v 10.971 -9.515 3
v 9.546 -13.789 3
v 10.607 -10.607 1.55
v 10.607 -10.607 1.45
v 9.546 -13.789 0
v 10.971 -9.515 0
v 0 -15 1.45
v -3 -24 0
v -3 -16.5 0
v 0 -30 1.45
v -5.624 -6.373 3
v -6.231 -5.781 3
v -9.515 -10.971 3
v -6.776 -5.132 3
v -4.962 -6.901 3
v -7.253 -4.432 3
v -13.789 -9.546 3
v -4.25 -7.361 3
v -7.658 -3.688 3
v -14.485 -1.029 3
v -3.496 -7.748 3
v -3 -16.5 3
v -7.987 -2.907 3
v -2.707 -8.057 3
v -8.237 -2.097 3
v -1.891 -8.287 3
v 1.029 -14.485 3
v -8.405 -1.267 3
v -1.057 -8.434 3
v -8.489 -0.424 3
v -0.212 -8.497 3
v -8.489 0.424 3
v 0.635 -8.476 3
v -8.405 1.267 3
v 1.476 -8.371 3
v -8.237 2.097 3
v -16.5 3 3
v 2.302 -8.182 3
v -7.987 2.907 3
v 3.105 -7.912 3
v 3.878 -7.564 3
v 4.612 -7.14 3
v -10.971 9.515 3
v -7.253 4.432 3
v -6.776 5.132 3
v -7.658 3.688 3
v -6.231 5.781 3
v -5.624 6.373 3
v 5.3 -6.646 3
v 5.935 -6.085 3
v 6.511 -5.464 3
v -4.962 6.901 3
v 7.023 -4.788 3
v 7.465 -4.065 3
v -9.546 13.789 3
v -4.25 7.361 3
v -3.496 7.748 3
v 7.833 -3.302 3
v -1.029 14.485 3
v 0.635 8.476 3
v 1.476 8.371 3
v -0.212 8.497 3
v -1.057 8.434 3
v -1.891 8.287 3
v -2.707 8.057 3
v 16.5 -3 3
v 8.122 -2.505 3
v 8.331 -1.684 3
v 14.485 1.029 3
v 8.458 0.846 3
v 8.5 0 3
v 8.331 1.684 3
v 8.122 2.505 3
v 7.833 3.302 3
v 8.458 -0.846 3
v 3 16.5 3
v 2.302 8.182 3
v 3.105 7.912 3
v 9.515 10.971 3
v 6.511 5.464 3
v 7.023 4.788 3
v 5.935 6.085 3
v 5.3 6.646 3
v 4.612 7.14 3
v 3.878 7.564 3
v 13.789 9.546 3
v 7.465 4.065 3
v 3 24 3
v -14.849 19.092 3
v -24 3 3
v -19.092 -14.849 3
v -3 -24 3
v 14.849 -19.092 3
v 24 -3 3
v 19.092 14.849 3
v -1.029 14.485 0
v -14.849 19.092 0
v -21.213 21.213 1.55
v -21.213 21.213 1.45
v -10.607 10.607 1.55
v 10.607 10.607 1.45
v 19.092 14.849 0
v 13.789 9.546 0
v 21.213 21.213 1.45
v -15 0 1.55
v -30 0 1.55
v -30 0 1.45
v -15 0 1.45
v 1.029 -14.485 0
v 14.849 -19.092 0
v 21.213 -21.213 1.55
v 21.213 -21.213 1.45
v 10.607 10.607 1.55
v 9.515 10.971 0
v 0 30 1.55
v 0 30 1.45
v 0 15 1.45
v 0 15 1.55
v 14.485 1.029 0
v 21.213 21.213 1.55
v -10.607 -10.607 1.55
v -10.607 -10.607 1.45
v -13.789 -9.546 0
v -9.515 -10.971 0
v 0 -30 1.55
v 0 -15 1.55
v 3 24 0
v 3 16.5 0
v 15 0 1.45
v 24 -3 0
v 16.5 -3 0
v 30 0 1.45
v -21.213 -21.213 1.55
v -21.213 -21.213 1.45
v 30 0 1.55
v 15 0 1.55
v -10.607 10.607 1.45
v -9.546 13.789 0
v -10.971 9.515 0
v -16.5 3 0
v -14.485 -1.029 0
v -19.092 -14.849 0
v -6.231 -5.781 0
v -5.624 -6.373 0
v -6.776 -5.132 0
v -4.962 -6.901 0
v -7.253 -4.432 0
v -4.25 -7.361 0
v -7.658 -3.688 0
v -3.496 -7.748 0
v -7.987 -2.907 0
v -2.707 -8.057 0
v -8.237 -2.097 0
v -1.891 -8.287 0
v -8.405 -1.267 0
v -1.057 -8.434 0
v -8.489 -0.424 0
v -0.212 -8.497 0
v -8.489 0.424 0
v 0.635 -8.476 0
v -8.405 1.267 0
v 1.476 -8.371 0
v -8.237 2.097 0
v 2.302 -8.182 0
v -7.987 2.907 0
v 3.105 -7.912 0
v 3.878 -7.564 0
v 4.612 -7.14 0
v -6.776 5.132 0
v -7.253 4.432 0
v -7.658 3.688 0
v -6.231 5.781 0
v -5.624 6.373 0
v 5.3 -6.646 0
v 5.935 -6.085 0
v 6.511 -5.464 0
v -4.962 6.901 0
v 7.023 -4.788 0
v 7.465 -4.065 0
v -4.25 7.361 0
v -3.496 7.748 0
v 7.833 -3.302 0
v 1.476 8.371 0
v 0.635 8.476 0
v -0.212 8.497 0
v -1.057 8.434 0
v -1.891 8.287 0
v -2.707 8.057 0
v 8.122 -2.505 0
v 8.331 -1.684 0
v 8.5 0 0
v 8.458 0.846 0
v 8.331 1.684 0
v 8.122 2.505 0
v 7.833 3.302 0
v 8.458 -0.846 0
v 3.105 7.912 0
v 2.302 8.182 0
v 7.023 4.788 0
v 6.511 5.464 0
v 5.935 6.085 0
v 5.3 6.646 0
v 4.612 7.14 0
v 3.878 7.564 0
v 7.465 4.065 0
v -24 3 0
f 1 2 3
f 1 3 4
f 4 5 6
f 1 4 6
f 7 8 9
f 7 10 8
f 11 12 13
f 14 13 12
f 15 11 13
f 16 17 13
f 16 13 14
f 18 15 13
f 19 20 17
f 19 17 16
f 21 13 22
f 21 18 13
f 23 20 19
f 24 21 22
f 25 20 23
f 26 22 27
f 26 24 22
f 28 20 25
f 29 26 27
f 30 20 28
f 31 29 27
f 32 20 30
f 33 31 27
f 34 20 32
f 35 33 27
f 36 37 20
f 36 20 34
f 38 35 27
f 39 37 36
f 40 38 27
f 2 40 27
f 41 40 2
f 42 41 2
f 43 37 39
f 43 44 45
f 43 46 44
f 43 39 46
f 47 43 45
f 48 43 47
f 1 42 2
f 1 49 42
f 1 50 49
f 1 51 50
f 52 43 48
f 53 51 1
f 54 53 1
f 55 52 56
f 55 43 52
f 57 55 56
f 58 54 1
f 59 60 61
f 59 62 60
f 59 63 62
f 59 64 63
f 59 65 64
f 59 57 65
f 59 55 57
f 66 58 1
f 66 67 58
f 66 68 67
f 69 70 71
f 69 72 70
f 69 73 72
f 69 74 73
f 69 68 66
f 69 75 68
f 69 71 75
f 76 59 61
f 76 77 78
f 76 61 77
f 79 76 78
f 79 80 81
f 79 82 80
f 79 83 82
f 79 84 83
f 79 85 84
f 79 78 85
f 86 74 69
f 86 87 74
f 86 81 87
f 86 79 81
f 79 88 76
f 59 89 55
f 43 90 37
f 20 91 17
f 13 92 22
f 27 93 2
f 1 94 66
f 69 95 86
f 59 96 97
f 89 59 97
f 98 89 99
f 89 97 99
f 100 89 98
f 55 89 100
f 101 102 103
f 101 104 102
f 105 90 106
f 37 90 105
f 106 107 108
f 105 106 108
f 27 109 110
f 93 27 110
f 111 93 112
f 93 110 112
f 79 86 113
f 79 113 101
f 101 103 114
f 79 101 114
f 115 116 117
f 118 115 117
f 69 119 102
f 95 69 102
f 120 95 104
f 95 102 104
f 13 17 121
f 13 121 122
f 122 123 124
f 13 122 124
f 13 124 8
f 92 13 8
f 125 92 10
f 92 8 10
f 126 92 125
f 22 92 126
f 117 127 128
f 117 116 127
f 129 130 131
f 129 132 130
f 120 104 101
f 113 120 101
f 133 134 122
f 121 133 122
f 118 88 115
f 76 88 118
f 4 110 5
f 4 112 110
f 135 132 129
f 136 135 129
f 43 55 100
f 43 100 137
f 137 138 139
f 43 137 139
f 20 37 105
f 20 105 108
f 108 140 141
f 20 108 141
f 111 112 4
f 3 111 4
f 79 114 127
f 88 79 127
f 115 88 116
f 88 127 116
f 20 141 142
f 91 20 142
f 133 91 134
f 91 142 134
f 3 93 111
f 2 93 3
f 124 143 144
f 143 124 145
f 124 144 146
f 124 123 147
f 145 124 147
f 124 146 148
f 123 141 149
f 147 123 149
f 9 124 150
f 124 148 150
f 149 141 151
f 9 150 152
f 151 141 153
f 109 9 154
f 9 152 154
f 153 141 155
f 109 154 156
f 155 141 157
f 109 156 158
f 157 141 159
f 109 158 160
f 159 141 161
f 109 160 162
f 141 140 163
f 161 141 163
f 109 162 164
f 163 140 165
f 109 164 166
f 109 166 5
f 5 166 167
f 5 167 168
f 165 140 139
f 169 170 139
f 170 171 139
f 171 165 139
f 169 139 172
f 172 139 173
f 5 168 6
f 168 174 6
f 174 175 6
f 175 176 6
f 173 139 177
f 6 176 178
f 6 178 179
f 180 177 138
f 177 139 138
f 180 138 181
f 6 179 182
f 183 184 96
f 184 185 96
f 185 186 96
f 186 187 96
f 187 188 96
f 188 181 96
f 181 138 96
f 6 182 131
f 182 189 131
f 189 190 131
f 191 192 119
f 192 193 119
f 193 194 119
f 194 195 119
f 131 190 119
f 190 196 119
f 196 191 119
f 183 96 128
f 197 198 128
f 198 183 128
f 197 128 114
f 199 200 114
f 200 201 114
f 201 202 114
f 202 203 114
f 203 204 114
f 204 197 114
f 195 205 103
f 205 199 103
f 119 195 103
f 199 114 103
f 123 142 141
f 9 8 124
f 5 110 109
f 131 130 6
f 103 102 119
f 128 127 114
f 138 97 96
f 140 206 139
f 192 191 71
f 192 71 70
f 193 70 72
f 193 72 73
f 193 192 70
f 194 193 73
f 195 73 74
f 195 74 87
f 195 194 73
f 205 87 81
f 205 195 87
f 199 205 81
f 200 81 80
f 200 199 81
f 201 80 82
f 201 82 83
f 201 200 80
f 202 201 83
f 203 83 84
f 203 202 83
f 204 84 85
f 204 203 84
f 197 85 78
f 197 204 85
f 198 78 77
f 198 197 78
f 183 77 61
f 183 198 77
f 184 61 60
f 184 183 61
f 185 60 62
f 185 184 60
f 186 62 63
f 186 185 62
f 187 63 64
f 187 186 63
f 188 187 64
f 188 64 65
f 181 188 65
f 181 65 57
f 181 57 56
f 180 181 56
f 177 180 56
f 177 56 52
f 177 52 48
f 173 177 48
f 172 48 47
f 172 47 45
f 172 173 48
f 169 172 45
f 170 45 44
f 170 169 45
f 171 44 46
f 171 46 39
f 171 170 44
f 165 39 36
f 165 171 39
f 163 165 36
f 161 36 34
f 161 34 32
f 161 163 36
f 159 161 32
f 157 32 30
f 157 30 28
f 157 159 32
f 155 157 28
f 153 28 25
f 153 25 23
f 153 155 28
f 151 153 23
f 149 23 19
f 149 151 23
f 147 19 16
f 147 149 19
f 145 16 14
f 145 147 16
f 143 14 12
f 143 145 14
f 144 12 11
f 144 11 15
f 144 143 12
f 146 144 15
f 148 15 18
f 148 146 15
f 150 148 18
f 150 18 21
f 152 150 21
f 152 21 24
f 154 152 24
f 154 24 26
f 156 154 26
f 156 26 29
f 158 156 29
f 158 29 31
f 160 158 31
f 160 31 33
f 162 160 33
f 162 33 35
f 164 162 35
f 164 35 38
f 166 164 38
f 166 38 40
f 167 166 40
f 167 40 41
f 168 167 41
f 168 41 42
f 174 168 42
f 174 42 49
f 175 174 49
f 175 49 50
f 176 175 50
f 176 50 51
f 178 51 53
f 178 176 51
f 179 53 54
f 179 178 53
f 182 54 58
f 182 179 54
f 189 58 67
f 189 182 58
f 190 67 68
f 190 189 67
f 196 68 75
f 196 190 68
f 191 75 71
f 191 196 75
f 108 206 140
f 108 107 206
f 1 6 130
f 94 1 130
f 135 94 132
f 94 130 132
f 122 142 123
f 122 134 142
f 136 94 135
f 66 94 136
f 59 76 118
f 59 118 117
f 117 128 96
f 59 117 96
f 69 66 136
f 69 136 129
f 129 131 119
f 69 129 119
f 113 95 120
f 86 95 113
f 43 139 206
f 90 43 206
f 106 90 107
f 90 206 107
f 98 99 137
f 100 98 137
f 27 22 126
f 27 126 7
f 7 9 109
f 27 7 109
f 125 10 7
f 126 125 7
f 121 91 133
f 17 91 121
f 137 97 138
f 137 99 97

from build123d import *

# Parameters (mm, degrees)
F0_R       = 8.5
F1_DEPTH   = 3
F2_SIZE2   = 3
F2_SIZE    = 1.45
F2_2_SIZE2 = 3
F2_2_SIZE  = 1.45
F2_3_SIZE2 = 3
F2_3_SIZE  = 1.45
F2_4_SIZE2 = 3
F2_4_SIZE  = 1.45
F2_5_SIZE2 = 3
F2_5_SIZE  = 1.45
F2_6_SIZE2 = 3
F2_6_SIZE  = 1.45
F2_7_SIZE2 = 3
F2_7_SIZE  = 1.45
F2_8_SIZE2 = 3
F2_8_SIZE  = 1.45
F3_SIZE2   = 1.45
F3_SIZE    = 3


with BuildPart() as f1:
    # F0 (on Top) → F1 (new body)
    with BuildSketch(Plane.XY):
        Polygon((9.5147186258, 10.9705627485), (-1.0294372515, 14.4852813742), (-10.9705627485, 9.5147186258), (-14.4852813742, -1.0294372515), (-9.5147186258, -10.9705627485), (1.0294372515, -14.4852813742), (10.9705627485, -9.5147186258), (14.4852813742, 1.0294372515), align=None)
        Circle(F0_R, mode=Mode.SUBTRACT)
        Polygon((-9.5147186258, -10.9705627485), (-14.4852813742, -1.0294372515), (-21.2132034356, -21.2132034356), (-10.6066017178, -10.6066017178), align=None)
        Polygon((1.0294372515, -14.4852813742), (-9.5147186258, -10.9705627485), (0, -30), (0, -15), align=None)
        Polygon((10.6066017178, -10.6066017178), (10.9705627485, -9.5147186258), (1.0294372515, -14.4852813742), (21.2132034356, -21.2132034356), align=None)
        Polygon((15, 0), (14.4852813742, 1.0294372515), (10.9705627485, -9.5147186258), (30, 0), align=None)
        Polygon((10.6066017178, 10.6066017178), (9.5147186258, 10.9705627485), (14.4852813742, 1.0294372515), (21.2132034356, 21.2132034356), align=None)
        Polygon((0, 30), (0, 15), (-1.0294372515, 14.4852813742), (9.5147186258, 10.9705627485), align=None)
        Polygon((-10.9705627485, 9.5147186258), (-1.0294372515, 14.4852813742), (-21.2132034356, 21.2132034356), (-10.6066017178, 10.6066017178), align=None)
        Polygon((-14.4852813742, -1.0294372515), (-10.9705627485, 9.5147186258), (-30, 0), (-15, 0), align=None)
    extrude(amount=F1_DEPTH)

    # F2
    f2_edges = [f1.edges().sort_by_distance(p)[0] for p in [
        (-15.909903, 15.909903, 3),
    ]]
    f2_side = f1.faces().sort_by_distance((-15.909903, 15.909903, 1.5))[0]
    chamfer(f2_edges, length=F2_SIZE, length2=F2_SIZE2, reference=f2_side)

    # F2#2
    f2_2_edges = [f1.edges().sort_by_distance(p)[0] for p in [
        (-22.5, 0, 3),
    ]]
    f2_2_side = f1.faces().sort_by_distance((-22.5, 0, 1.5))[0]
    chamfer(f2_2_edges, length=F2_2_SIZE, length2=F2_2_SIZE2, reference=f2_2_side)

    # F2#3
    f2_3_edges = [f1.edges().sort_by_distance(p)[0] for p in [
        (-15.909903, -15.909903, 3),
    ]]
    f2_3_side = f1.faces().sort_by_distance((-15.909903, -15.909903, 1.5))[0]
    chamfer(f2_3_edges, length=F2_3_SIZE, length2=F2_3_SIZE2, reference=f2_3_side)

    # F2#4
    f2_4_edges = [f1.edges().sort_by_distance(p)[0] for p in [
        (0, -22.5, 3),
    ]]
    f2_4_side = f1.faces().sort_by_distance((0, -22.5, 1.5))[0]
    chamfer(f2_4_edges, length=F2_4_SIZE, length2=F2_4_SIZE2, reference=f2_4_side)

    # F2#5
    f2_5_edges = [f1.edges().sort_by_distance(p)[0] for p in [
        (15.909903, -15.909903, 3),
    ]]
    f2_5_side = f1.faces().sort_by_distance((15.909903, -15.909903, 1.5))[0]
    chamfer(f2_5_edges, length=F2_5_SIZE, length2=F2_5_SIZE2, reference=f2_5_side)

    # F2#6
    f2_6_edges = [f1.edges().sort_by_distance(p)[0] for p in [
        (22.5, 0, 3),
    ]]
    f2_6_side = f1.faces().sort_by_distance((22.5, 0, 1.5))[0]
    chamfer(f2_6_edges, length=F2_6_SIZE, length2=F2_6_SIZE2, reference=f2_6_side)

    # F2#7
    f2_7_edges = [f1.edges().sort_by_distance(p)[0] for p in [
        (15.909903, 15.909903, 3),
    ]]
    f2_7_side = f1.faces().sort_by_distance((15.909903, 15.909903, 1.5))[0]
    chamfer(f2_7_edges, length=F2_7_SIZE, length2=F2_7_SIZE2, reference=f2_7_side)

    # F2#8
    f2_8_edges = [f1.edges().sort_by_distance(p)[0] for p in [
        (0, 22.5, 3),
    ]]
    f2_8_side = f1.faces().sort_by_distance((0, 22.5, 1.5))[0]
    chamfer(f2_8_edges, length=F2_8_SIZE, length2=F2_8_SIZE2, reference=f2_8_side)

    # F3
    f3_edges = [f1.edges().sort_by_distance(p)[0] for p in [
        (0, -22.5, 0),
        (15.909903, -15.909903, 0),
        (22.5, 0, 0),
        (15.909903, 15.909903, 0),
        (0, 22.5, 0),
        (-15.909903, 15.909903, 0),
        (-22.5, 0, 0),
        (-15.909903, -15.909903, 0),
    ]]
    f3_side = f1.faces().sort_by_distance((-16.509903, -15.309903, 0))[0]
    chamfer(f3_edges, length=F3_SIZE, length2=F3_SIZE2, reference=f3_side)


solid = f1.part
